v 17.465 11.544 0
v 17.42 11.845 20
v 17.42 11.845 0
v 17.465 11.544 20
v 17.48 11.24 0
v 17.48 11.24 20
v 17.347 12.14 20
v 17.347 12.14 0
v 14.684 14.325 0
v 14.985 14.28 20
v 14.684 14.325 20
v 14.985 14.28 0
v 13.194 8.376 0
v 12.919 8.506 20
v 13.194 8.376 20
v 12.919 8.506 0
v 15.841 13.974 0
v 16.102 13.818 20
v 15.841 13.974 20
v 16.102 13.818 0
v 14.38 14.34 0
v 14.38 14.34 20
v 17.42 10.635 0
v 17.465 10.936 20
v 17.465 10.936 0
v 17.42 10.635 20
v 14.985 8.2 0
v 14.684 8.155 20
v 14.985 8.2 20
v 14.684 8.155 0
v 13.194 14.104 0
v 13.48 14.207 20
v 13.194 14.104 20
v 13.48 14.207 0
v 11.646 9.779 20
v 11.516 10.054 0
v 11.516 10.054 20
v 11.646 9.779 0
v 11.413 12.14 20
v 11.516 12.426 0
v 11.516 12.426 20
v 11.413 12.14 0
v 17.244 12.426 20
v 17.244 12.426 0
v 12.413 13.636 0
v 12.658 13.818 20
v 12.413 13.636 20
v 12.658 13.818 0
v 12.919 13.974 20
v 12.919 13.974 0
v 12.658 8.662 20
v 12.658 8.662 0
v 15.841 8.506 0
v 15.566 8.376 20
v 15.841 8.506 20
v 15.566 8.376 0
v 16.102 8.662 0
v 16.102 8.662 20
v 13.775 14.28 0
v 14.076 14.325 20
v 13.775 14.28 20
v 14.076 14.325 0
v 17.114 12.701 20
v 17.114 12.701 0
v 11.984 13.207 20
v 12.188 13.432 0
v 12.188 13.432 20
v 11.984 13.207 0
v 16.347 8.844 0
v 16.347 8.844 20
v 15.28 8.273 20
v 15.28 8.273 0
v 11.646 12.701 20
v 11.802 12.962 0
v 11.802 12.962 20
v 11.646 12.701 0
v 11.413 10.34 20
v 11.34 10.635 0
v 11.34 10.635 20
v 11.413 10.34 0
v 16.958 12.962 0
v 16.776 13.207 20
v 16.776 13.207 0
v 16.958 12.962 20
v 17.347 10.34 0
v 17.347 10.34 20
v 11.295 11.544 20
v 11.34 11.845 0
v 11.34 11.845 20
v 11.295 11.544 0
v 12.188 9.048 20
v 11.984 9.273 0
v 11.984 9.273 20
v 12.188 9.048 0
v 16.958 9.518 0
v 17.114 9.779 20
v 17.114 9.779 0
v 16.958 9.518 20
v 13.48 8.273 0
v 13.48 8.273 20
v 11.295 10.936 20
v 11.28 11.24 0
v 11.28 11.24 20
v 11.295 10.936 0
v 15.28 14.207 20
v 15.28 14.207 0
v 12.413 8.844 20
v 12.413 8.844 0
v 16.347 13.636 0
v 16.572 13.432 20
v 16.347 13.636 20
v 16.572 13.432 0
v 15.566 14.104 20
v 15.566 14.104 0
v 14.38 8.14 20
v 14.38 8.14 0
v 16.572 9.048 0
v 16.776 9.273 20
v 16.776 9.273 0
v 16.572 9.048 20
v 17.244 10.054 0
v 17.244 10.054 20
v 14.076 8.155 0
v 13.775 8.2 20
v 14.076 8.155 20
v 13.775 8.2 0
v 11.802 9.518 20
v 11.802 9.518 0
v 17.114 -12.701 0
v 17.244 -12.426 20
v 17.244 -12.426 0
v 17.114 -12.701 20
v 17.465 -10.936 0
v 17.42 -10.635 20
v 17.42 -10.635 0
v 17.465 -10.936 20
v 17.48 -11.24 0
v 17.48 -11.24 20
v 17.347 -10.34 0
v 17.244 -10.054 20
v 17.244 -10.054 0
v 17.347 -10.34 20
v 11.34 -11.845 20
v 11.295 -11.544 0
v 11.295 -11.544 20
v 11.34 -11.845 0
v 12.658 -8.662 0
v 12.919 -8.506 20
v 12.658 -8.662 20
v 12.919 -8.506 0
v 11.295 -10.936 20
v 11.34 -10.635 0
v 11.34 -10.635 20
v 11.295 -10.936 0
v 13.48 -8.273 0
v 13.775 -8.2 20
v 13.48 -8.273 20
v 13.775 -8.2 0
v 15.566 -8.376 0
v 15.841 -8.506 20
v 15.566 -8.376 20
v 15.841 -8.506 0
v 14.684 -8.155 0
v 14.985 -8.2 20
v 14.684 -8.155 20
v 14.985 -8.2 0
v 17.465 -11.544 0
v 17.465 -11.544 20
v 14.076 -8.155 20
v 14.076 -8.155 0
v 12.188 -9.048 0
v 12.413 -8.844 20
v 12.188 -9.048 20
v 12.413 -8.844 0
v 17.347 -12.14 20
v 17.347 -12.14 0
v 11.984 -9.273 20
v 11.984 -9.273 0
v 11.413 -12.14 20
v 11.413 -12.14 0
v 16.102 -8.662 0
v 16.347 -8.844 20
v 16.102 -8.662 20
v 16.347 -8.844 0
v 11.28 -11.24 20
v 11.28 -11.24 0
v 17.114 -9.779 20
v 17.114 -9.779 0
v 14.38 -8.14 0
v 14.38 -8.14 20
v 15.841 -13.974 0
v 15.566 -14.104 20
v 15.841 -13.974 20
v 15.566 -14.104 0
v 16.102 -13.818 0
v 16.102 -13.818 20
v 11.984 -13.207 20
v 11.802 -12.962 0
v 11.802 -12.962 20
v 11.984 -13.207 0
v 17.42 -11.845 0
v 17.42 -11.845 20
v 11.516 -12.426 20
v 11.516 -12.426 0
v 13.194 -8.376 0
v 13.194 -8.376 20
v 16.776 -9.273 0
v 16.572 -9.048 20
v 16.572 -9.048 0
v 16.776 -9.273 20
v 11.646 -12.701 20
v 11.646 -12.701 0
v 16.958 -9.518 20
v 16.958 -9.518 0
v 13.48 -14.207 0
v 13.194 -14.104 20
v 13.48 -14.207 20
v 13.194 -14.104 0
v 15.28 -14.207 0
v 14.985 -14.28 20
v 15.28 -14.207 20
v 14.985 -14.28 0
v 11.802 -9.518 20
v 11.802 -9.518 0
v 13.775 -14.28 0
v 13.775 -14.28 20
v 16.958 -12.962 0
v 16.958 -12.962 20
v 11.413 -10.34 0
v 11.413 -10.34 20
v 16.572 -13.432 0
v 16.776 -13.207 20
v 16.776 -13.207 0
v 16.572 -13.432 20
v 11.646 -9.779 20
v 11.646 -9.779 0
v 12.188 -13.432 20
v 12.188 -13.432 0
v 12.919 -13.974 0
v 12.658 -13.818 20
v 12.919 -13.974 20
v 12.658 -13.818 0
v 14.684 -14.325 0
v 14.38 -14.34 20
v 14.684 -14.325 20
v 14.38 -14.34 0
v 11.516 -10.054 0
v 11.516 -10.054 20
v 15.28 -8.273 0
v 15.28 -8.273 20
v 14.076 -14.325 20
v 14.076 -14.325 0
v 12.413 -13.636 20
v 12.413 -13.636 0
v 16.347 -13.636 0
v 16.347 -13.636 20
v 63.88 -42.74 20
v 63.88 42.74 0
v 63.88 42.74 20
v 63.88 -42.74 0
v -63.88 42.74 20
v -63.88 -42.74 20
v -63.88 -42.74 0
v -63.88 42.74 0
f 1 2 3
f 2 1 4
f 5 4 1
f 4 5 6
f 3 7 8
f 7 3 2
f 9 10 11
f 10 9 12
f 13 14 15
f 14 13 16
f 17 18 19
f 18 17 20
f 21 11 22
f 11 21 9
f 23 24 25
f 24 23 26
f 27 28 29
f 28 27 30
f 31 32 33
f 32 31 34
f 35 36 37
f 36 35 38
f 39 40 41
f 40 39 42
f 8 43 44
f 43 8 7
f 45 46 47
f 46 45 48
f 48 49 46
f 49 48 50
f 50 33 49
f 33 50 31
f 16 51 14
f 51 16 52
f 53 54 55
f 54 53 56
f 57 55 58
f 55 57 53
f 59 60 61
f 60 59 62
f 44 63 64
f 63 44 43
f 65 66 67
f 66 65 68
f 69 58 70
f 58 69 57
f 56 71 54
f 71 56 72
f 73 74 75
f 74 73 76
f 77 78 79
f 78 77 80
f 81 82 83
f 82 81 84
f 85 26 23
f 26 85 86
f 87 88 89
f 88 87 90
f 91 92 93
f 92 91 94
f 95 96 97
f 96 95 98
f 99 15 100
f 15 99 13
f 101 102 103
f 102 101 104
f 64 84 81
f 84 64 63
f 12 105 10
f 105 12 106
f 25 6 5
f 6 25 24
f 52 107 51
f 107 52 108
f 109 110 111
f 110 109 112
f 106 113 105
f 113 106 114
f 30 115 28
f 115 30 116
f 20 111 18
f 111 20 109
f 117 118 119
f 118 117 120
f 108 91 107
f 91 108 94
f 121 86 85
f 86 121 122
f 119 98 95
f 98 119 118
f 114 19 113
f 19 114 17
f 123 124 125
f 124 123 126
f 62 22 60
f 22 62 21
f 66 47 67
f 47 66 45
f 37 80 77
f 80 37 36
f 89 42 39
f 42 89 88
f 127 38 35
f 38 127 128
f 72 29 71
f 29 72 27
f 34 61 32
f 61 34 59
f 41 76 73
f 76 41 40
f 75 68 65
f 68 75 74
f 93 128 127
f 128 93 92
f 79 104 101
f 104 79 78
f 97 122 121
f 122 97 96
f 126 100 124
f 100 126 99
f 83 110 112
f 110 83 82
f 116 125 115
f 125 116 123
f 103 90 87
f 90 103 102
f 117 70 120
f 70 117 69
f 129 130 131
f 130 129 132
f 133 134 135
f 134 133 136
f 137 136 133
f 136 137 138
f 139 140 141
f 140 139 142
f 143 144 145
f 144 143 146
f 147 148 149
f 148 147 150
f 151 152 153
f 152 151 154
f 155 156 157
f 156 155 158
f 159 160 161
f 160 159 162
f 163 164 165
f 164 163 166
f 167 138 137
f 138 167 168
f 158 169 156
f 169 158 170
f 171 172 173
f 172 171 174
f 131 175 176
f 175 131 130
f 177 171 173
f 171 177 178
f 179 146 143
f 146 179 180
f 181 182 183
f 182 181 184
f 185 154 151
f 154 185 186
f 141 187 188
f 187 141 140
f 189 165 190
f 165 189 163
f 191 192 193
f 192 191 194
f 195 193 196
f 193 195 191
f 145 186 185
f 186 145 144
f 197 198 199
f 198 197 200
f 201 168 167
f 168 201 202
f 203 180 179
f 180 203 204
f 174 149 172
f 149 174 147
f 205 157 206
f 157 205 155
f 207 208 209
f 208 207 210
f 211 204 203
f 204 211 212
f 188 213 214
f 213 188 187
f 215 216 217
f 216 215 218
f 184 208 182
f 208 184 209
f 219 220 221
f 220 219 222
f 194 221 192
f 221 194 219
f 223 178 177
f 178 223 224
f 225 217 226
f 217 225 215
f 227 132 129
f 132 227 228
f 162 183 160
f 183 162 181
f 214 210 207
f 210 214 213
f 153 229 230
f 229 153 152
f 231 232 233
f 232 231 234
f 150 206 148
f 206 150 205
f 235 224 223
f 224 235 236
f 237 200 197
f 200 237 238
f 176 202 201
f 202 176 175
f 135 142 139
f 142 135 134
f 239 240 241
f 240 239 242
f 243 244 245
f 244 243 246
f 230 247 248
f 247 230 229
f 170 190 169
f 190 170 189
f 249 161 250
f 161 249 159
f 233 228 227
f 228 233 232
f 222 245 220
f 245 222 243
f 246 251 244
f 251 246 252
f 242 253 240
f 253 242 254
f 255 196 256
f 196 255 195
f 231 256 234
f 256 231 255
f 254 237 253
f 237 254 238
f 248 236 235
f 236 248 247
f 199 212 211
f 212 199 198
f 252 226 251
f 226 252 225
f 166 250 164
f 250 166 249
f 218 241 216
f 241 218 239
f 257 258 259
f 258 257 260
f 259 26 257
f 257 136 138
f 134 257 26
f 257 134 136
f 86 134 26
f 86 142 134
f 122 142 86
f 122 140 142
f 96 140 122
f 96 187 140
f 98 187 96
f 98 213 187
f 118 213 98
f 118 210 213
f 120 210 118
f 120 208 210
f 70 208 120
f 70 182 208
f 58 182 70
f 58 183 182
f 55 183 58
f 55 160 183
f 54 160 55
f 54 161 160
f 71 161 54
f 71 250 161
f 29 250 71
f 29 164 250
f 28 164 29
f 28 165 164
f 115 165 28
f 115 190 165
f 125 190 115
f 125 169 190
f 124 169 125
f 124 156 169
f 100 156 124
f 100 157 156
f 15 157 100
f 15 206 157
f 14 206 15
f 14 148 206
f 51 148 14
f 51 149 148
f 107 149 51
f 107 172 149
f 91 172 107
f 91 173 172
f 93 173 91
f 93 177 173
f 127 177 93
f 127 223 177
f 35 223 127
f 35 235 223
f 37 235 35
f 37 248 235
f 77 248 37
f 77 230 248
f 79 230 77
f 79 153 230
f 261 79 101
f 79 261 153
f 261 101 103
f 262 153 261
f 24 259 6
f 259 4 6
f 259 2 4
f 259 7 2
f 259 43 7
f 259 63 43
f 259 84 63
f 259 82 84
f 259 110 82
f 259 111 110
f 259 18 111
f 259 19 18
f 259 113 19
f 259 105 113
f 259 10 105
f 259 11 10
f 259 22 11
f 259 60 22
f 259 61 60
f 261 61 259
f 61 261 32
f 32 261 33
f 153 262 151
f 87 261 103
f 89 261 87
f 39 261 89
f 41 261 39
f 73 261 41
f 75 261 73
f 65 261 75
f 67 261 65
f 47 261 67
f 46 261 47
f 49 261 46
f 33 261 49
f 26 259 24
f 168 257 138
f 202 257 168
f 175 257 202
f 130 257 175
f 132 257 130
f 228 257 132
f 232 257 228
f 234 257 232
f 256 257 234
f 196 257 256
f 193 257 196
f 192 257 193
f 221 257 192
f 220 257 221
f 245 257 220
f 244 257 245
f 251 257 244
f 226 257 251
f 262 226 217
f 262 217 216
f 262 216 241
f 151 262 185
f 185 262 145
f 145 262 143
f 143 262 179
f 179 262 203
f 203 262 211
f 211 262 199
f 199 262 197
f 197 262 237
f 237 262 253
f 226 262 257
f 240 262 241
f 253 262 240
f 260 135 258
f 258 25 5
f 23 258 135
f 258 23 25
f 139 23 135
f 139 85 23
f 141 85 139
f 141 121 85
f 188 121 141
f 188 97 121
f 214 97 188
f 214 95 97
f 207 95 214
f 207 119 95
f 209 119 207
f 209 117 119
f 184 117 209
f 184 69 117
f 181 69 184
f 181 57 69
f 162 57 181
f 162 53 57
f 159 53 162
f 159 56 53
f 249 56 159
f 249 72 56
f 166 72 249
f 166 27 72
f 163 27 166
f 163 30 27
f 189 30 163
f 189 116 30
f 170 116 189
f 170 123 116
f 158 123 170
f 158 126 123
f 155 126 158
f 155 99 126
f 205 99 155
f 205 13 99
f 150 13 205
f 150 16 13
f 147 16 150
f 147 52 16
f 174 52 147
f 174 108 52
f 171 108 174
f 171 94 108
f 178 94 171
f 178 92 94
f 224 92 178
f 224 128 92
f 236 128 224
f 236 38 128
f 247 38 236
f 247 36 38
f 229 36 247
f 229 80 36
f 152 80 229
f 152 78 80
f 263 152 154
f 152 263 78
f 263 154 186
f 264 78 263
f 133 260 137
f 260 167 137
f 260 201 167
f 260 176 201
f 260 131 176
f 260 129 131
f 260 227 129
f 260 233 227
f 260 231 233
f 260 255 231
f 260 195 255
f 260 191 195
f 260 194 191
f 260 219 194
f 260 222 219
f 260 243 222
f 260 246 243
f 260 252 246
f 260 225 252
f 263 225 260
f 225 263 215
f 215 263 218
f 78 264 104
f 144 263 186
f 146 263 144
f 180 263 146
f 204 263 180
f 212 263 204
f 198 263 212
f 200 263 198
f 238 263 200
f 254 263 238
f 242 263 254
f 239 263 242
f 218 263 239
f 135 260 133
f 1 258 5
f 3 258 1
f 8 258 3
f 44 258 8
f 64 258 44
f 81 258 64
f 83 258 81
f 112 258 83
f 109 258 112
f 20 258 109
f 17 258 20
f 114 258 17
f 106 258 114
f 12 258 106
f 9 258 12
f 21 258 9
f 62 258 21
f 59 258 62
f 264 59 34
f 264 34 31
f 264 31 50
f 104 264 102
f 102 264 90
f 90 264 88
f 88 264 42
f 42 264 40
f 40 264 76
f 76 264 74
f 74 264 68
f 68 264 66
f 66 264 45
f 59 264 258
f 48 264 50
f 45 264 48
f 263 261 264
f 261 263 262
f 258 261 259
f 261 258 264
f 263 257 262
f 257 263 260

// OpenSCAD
// Built by bench/smallmodels/features/compiler.py from a list of features.
$fn = 64;
difference() {
  union() {
    translate([0, 0, 0]) translate([-63.88, -42.74, 0]) cube([127.76, 85.48, 20]);
  }
  union() {
    translate([14.38, 11.24, -0.01]) rotate([0, 0, 0]) cylinder(d = 6.2, h = 20.02);
    translate([14.38, -11.24, -0.01]) rotate([0, 0, 0]) cylinder(d = 6.2, h = 20.02);
  }
}
